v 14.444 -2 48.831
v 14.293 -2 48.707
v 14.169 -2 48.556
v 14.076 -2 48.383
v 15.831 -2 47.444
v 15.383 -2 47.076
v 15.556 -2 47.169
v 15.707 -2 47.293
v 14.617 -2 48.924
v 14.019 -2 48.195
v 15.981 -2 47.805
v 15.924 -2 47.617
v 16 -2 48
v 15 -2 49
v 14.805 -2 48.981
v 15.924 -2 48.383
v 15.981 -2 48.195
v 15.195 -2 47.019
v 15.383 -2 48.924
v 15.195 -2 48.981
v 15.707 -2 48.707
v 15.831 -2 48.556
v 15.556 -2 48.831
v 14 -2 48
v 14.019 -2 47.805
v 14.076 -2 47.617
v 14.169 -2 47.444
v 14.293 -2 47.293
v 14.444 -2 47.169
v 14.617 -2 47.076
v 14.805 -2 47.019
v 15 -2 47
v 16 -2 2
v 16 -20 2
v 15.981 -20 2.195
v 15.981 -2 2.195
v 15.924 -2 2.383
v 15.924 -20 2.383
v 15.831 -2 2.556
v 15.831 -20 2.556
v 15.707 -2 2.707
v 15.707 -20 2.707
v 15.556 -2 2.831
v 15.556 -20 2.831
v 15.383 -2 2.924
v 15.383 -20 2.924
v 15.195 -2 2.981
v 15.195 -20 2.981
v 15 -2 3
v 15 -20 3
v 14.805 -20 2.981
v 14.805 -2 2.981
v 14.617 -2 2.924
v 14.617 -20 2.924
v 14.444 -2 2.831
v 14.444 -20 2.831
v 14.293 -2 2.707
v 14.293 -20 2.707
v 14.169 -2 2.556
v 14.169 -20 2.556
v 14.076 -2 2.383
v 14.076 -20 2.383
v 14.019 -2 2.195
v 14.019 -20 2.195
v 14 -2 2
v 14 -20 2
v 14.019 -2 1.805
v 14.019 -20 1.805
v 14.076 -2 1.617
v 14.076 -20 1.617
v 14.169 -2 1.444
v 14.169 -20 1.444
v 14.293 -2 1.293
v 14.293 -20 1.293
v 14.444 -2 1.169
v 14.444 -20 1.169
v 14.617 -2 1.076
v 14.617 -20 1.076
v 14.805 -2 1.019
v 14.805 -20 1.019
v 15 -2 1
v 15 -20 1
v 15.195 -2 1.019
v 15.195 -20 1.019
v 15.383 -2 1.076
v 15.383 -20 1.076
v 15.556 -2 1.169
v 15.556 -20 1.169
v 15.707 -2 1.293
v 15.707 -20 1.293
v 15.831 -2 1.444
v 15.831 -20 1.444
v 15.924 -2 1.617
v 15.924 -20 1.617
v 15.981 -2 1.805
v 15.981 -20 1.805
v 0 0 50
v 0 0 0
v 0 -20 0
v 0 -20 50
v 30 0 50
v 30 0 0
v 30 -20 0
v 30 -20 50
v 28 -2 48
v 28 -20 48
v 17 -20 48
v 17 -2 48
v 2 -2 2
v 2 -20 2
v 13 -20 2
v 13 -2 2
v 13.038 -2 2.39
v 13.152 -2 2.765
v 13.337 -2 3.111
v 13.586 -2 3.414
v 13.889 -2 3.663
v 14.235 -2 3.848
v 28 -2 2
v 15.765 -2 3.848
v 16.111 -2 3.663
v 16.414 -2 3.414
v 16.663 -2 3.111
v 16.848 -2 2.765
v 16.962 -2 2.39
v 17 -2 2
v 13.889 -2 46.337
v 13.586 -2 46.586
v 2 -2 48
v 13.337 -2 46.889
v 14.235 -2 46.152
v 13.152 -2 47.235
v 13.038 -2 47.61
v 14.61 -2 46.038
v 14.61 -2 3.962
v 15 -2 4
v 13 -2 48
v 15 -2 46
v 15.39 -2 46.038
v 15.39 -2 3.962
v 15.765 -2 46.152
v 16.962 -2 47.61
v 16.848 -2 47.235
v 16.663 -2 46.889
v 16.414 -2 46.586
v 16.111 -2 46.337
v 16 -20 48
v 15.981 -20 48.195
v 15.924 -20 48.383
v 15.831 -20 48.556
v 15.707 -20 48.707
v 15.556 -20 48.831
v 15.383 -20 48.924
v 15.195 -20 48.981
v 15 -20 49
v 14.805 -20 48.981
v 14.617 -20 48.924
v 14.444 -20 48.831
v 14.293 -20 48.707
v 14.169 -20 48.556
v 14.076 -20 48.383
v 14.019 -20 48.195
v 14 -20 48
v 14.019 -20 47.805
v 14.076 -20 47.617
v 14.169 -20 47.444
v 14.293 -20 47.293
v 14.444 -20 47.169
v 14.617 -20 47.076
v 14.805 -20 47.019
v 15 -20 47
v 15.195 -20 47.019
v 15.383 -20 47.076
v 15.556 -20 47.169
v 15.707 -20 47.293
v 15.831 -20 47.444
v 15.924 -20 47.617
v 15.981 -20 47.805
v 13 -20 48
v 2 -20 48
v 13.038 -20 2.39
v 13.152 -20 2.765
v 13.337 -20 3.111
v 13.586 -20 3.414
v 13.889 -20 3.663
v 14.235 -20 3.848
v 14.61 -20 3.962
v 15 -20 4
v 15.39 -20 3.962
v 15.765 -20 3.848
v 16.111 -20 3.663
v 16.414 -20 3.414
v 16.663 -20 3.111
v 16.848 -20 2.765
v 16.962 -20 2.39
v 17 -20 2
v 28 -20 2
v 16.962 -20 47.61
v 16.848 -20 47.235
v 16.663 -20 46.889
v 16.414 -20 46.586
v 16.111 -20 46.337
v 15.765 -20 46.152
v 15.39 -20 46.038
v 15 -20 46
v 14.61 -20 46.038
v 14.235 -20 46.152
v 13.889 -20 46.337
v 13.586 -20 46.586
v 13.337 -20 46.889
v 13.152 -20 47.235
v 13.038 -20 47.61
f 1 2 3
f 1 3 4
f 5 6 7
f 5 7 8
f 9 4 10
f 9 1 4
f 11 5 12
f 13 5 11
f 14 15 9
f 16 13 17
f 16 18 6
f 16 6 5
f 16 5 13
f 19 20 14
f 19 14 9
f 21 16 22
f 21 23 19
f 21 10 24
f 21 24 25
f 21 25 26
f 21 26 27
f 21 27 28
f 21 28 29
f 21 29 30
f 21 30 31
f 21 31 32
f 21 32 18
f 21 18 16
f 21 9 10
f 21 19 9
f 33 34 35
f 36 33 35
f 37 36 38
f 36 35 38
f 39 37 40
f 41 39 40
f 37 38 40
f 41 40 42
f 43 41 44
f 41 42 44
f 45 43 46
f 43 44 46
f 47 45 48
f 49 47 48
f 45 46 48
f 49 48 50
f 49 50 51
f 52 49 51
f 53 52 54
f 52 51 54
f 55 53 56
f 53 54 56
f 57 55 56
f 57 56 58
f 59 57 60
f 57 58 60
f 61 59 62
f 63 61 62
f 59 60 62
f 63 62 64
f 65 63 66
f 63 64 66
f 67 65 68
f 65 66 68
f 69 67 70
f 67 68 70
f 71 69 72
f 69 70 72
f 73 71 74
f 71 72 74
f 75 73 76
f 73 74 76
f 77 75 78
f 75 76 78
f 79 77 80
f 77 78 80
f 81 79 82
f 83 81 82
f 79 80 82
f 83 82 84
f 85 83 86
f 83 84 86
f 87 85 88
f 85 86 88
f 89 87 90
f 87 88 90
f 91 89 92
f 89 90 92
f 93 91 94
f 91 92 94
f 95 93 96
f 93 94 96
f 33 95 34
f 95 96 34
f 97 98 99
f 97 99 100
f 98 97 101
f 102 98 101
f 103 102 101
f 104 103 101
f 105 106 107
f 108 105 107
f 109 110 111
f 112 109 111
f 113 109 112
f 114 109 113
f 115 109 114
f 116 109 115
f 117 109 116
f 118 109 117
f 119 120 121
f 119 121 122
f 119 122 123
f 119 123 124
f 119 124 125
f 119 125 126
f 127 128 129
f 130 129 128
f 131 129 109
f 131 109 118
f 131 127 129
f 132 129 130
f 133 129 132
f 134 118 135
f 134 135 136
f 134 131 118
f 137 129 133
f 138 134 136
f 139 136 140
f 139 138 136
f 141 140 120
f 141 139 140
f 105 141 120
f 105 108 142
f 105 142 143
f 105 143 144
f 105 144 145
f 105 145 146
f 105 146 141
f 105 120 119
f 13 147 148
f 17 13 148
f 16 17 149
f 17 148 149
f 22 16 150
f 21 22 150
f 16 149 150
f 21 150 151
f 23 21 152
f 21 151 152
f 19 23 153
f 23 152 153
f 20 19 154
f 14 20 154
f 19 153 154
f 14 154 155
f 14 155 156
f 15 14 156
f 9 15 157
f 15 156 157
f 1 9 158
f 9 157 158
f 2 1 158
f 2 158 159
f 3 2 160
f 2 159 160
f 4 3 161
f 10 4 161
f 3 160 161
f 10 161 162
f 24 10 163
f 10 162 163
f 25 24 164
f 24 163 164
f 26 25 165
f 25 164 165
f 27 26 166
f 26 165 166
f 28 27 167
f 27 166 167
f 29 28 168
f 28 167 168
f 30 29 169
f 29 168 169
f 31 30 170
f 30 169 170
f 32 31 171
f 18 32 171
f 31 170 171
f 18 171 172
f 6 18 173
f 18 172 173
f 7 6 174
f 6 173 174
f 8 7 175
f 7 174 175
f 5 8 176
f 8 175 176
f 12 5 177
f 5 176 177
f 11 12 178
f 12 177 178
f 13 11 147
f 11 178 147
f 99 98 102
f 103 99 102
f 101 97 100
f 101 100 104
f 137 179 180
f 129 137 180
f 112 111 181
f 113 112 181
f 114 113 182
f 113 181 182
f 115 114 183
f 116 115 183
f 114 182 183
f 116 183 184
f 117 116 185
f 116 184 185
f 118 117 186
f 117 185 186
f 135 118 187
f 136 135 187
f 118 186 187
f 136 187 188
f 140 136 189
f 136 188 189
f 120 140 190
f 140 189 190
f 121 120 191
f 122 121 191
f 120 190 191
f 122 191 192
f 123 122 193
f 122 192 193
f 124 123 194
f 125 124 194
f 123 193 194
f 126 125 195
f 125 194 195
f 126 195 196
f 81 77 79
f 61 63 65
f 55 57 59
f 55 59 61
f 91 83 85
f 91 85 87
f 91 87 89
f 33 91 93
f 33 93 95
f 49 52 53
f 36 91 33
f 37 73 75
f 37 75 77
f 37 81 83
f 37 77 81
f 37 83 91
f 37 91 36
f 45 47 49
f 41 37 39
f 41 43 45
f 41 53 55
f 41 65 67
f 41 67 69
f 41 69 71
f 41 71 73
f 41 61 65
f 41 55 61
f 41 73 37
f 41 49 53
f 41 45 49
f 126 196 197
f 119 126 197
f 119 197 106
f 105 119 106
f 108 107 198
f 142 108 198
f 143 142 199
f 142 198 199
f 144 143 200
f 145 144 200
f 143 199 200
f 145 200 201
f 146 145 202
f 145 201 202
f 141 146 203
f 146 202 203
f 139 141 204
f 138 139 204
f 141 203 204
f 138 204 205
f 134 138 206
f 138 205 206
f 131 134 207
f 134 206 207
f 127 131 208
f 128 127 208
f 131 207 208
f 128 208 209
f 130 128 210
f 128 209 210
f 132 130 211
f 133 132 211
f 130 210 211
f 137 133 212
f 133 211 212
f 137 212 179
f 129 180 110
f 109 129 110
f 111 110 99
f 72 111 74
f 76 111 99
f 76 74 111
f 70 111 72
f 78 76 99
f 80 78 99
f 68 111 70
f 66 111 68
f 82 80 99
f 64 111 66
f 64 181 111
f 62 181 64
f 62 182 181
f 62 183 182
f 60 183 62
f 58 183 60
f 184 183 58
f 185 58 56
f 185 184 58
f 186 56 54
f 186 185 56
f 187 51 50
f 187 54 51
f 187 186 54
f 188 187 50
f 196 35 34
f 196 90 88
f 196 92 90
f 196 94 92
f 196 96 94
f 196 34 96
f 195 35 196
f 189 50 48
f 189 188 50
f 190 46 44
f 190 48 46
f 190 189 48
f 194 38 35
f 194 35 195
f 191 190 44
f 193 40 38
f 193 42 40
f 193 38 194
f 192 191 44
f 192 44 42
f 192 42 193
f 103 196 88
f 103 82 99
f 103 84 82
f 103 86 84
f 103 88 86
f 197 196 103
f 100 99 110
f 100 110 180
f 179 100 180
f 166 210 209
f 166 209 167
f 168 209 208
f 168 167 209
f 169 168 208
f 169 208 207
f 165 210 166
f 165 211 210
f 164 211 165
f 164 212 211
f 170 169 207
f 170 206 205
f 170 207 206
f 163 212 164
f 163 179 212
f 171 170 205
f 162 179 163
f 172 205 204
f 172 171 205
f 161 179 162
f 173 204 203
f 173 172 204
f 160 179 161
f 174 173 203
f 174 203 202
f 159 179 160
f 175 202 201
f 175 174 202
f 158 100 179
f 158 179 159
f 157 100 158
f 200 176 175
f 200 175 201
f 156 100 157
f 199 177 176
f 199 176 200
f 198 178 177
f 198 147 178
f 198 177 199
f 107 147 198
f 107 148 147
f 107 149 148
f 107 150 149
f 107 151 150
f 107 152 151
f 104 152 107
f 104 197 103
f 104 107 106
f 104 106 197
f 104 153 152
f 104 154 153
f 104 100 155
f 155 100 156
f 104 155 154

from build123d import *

# Parameters (mm, degrees)
F0_W     = 30
F0_H     = 50
F1_DEPTH = 20
F3_R     = 1
F4_DEPTH = 18


with BuildPart() as f1:
    # F0 (on Front) → F1 (new body)
    with BuildSketch(Plane.XZ):
        with Locations((15, 25)):
            Rectangle(F0_W, F0_H)
    extrude(amount=F1_DEPTH)

    # F3 (on offset) → F4 (cut)
    with BuildSketch(Plane.XZ.offset(20)):
        with BuildLine():
            Line((2, 48), (2, 2))
            Line((2, 2), (13, 2))
            ThreePointArc((13, 2), (15, 4), (17, 2))
            Line((17, 2), (28, 2))
            Line((28, 2), (28, 48))
            Line((28, 48), (17, 48))
            ThreePointArc((17, 48), (15, 46), (13, 48))
            Line((13, 48), (2, 48))
        make_face()
        with Locations((15, 2)):
            Circle(F3_R)
        with Locations((15, 48)):
            Circle(F3_R)
    extrude(amount=-F4_DEPTH, mode=Mode.SUBTRACT)


solid = f1.part
